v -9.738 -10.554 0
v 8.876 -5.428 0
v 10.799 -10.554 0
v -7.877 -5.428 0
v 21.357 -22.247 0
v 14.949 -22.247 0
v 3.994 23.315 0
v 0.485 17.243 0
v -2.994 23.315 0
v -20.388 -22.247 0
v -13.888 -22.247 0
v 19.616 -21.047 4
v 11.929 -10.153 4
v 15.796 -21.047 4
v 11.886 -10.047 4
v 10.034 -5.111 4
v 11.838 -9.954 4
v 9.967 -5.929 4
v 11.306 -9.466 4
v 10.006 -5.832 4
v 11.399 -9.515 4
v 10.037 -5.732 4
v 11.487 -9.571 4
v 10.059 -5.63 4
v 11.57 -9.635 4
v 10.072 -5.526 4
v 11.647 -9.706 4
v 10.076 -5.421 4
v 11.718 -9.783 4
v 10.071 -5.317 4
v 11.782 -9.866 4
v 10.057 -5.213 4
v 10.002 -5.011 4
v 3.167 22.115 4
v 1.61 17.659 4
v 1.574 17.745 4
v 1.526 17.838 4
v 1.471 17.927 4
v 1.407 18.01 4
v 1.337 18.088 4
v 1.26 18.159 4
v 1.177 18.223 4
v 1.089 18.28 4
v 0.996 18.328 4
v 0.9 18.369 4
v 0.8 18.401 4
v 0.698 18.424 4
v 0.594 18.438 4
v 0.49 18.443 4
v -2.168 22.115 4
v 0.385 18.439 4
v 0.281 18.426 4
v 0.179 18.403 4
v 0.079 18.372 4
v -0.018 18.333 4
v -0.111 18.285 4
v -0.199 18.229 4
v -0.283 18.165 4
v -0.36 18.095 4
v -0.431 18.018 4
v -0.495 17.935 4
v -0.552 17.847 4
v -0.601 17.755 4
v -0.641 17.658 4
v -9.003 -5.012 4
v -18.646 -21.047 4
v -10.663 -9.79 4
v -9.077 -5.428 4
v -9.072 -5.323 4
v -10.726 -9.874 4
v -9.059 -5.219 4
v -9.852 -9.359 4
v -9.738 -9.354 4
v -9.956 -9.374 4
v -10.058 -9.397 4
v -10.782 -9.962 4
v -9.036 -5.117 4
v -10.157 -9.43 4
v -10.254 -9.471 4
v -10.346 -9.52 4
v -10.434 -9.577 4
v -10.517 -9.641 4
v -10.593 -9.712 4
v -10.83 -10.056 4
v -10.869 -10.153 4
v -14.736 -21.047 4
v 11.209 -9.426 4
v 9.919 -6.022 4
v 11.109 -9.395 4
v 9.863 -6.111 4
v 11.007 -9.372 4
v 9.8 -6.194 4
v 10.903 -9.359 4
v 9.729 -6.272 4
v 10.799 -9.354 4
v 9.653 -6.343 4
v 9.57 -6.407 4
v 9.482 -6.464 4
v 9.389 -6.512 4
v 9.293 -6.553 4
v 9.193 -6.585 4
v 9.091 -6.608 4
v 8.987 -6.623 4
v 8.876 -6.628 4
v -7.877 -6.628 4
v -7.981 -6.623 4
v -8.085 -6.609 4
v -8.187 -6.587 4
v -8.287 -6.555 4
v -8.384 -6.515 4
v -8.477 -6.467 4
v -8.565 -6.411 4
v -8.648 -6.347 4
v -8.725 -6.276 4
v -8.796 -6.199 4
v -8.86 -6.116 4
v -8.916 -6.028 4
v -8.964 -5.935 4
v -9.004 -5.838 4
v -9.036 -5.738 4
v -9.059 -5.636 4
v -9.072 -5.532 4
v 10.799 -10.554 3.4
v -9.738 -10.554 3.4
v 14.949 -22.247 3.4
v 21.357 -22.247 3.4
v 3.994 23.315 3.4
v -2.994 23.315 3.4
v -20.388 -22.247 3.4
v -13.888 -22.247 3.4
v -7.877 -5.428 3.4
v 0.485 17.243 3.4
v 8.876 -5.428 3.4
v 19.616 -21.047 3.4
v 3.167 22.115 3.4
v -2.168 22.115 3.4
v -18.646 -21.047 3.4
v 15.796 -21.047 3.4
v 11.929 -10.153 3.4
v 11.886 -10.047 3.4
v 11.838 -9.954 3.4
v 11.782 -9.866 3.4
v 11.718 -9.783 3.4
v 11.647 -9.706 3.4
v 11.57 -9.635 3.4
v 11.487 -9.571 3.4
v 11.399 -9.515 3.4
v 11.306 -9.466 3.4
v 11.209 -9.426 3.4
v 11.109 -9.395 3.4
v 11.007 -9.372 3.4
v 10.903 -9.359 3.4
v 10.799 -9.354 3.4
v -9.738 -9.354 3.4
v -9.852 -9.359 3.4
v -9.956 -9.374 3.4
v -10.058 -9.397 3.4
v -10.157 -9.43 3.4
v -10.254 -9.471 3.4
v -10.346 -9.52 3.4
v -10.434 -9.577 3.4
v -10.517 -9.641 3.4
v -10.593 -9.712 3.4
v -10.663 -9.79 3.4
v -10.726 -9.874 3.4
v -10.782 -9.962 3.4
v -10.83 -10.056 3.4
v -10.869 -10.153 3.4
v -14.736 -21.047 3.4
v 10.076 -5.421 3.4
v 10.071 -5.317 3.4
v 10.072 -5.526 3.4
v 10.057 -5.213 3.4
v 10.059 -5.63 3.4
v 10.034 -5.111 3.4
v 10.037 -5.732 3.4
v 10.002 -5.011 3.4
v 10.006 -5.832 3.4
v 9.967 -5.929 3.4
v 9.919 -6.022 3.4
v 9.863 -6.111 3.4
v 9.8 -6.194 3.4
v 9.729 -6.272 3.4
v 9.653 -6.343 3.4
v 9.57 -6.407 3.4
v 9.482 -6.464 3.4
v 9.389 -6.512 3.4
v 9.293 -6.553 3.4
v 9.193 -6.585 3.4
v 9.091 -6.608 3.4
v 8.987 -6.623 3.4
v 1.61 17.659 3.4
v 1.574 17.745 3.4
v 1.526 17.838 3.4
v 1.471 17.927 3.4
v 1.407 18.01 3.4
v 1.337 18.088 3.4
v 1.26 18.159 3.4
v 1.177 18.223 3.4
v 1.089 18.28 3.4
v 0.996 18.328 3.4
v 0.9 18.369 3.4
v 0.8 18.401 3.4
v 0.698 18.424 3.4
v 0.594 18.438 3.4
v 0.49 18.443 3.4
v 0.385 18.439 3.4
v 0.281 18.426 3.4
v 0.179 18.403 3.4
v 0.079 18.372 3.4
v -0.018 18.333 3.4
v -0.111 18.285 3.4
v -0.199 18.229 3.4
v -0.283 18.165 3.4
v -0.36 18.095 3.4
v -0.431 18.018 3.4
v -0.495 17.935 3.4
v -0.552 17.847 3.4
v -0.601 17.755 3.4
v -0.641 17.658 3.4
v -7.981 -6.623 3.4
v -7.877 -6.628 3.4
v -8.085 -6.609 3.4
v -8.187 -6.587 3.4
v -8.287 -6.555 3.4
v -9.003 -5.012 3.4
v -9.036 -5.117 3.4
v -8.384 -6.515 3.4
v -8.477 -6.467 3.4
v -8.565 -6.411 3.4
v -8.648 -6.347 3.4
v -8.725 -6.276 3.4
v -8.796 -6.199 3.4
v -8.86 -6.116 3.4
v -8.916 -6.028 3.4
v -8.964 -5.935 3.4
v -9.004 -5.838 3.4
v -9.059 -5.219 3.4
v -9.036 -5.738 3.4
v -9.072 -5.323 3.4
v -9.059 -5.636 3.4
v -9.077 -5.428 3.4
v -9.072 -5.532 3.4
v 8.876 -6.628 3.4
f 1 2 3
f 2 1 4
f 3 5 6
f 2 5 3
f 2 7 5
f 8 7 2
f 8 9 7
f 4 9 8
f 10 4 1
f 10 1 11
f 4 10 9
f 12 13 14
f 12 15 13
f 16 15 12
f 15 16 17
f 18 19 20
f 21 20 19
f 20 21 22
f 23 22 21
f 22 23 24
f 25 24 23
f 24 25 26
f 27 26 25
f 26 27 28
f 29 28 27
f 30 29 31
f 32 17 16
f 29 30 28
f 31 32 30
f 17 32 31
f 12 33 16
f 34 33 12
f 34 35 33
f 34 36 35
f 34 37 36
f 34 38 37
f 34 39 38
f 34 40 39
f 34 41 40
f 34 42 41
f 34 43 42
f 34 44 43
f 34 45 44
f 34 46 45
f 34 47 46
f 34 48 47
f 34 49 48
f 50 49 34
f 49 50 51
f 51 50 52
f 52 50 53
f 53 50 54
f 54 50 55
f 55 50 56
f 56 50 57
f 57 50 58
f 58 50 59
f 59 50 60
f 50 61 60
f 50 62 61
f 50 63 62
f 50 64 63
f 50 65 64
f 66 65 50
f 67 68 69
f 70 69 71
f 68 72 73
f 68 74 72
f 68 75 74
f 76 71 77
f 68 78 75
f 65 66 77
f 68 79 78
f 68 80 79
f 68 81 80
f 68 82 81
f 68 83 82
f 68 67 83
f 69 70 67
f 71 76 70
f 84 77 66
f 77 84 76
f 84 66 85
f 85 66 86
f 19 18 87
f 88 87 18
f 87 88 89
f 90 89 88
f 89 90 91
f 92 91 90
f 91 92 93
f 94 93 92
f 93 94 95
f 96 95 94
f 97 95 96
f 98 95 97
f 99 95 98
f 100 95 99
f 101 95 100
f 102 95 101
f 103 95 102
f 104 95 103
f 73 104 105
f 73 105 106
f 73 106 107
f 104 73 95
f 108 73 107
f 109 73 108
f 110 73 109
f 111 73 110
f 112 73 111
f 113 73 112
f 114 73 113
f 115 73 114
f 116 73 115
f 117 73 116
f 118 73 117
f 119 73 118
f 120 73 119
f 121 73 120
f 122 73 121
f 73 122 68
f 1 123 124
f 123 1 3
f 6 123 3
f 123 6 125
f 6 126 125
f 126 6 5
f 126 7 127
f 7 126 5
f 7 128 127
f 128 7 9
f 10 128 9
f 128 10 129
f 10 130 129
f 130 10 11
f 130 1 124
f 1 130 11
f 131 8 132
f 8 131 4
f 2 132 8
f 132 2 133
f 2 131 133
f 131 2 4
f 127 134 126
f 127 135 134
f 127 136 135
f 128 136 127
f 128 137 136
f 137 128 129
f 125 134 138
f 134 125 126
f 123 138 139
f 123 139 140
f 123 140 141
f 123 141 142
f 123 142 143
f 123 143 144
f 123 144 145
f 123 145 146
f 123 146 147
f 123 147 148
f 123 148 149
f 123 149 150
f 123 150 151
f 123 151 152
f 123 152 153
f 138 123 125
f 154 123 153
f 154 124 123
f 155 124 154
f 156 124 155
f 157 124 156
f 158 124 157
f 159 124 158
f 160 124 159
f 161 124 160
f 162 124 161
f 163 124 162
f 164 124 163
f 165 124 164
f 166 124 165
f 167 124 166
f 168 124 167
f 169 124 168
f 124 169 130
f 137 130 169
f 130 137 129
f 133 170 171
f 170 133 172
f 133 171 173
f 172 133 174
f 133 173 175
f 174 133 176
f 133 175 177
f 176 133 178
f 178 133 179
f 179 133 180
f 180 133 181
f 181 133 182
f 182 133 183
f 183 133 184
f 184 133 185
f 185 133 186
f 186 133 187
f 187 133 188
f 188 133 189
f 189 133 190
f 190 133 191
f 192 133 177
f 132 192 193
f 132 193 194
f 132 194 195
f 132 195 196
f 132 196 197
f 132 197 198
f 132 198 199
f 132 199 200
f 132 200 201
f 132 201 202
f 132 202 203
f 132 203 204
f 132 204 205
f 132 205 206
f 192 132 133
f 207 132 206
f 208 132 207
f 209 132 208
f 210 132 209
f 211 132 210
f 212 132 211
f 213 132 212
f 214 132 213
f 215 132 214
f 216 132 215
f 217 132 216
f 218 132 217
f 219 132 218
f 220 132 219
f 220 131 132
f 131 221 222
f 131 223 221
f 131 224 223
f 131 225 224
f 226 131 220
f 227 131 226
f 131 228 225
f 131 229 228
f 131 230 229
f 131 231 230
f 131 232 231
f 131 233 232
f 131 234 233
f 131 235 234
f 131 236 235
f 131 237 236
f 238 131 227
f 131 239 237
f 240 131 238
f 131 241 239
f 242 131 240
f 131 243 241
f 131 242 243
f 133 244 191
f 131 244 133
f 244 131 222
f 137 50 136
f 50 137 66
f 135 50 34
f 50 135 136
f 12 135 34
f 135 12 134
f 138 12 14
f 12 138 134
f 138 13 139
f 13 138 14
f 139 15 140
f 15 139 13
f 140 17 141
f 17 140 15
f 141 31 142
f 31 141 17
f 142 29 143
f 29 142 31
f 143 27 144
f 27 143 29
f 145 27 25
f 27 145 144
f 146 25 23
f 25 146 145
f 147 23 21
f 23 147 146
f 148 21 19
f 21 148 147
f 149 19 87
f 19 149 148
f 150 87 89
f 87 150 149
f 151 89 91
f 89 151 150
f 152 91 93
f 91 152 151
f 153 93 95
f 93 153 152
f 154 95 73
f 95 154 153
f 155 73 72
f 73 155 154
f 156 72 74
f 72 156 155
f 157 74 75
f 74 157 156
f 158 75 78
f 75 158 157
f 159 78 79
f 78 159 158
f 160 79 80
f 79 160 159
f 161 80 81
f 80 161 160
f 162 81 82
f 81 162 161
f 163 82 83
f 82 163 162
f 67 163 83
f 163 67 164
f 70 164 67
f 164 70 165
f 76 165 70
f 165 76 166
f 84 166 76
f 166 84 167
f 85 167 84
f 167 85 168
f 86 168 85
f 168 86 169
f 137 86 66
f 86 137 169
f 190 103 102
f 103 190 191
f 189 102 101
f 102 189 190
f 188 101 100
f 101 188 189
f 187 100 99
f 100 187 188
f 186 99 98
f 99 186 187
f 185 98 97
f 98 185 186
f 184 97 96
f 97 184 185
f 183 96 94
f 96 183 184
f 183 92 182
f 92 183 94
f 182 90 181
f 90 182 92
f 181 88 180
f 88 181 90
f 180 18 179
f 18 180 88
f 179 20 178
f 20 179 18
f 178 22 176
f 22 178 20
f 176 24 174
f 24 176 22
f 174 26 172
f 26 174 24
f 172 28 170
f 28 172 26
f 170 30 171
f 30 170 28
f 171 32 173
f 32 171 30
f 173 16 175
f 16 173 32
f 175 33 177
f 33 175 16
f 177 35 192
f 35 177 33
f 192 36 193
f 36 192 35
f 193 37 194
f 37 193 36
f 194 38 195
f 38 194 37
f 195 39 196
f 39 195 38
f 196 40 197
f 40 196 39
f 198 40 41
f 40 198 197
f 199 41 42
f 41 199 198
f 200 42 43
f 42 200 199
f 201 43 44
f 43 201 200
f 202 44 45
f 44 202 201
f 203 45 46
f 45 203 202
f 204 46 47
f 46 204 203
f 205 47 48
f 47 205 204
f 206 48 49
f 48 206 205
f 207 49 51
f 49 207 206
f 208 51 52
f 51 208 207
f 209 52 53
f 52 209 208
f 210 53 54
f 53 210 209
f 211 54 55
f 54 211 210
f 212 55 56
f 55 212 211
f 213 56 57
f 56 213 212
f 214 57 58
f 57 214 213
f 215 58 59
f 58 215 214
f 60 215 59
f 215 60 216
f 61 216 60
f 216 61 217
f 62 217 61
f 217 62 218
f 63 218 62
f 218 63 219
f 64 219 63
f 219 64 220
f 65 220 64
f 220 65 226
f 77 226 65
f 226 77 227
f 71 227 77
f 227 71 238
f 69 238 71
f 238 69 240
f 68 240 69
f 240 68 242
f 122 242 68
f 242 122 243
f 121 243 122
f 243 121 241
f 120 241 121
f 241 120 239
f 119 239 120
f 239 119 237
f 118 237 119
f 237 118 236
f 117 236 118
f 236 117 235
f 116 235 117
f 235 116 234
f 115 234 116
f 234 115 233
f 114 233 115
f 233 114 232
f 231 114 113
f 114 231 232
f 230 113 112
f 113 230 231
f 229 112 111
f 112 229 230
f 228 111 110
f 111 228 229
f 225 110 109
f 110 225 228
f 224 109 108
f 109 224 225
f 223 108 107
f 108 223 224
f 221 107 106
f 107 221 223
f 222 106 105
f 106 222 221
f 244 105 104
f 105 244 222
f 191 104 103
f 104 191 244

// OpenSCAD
// The character to genearate
character = "A";
/* [Preview] */
// This moves the magnet holes to the top of the letter so positioning can be easier. Disable before final generation.
preview = false;
/* [General] */
// Solid space on the letter bottom before the magnet holes start. Usually the height of a layer is enough.
bottom_height = 0.3; // .1
// Clearance used for the magnet holes (both the diameter and the height)
clearance = 0.3; // .1

/* [Magnets] */
// Diameter of the magnet 
magnet_diameter = 4; //.1
// Height of the magnet
magnet_height = 2; // .1

/* [Text] */
// Font to use. See the font list window for possible values
font = "Arial Black";
// Size of the text
text_size = 45; // .1
// Thickness of the letter
letter_height = 4; // .1
// trim a contour at the top so it's distinguishable from the bottom part with the magnet
top_contour = true;
contour_height = 0.6;
contour_width = 1.2;

/* [Magnet positions] */

magnet1_enabled = false;
magnet1_pos = [0, 0]; // [-1000:.1:1000]

magnet2_enabled = false;
magnet2_pos = [0, 0]; // [-1000:.1:1000]

magnet3_enabled = false;
magnet3_pos = [0, 0]; // [-1000:.1:1000]

magnet4_enabled = false;
magnet4_pos = [0, 0]; // [-1000:.1:1000]

magnet5_enabled = false;
magnet5_pos = [0, 0]; // [-1000:.1:1000]

magnet6_enabled = false;
magnet6_pos = [0, 0]; // [-1000:.1:1000]

magnet7_enabled = false;
magnet7_pos = [0, 0]; // [-1000:.1:1000]

magnet8_enabled = false;
magnet8_pos = [0, 0]; // [-1000:.1:1000]

magnet9_enabled = false;
magnet9_pos = [0, 0]; // [-1000:.1:1000]

magnet10_enabled = false;
magnet10_pos = [0, 0]; // [-1000:.1:1000]

 /* [Hidden] */
$fn=72;

magnet_position = preview ? letter_height - magnet_height / 2 : bottom_height;
comm_x = 0; 
comm_c_y = text_size / 3 + magnet_diameter / 2;


magnets = [
    [magnet1_enabled, magnet1_pos],
    [magnet2_enabled, magnet2_pos],
    [magnet3_enabled, magnet3_pos],
    [magnet4_enabled, magnet4_pos],
    [magnet5_enabled, magnet5_pos],
    [magnet6_enabled, magnet6_pos],
    [magnet7_enabled, magnet7_pos],
    [magnet8_enabled, magnet8_pos],
    [magnet9_enabled, magnet9_pos],
    [magnet10_enabled, magnet10_pos],
    ];

magnet_centers = [for (m = magnets) if (m[0]) m[1] ];

letter(character, magnet_centers);


module letter(character, magnet_centers=[]) {
    difference() {
        linear_extrude(height = letter_height)
        text(text=character, size=text_size, font=font, halign="center", valign = "center");
        for (mc = magnet_centers) magnet_hole(mc.x, mc.y);

        if (top_contour) {
            color("blue")
            translate([0, 0, letter_height - contour_height])
            linear_extrude(contour_height)
            difference() {
                text(text=character, size=text_size, font=font, halign="center", valign = "center");
                offset(r = -contour_width)
                text(text=character, size=text_size, font=font, halign="center", valign = "center");
            }
        }
    }
}

module magnet_hole(x, y) {
    color("red")
    translate([x, y, magnet_position])
    linear_extrude(height = magnet_height + clearance)
    circle(d = magnet_diameter + clearance);
}
